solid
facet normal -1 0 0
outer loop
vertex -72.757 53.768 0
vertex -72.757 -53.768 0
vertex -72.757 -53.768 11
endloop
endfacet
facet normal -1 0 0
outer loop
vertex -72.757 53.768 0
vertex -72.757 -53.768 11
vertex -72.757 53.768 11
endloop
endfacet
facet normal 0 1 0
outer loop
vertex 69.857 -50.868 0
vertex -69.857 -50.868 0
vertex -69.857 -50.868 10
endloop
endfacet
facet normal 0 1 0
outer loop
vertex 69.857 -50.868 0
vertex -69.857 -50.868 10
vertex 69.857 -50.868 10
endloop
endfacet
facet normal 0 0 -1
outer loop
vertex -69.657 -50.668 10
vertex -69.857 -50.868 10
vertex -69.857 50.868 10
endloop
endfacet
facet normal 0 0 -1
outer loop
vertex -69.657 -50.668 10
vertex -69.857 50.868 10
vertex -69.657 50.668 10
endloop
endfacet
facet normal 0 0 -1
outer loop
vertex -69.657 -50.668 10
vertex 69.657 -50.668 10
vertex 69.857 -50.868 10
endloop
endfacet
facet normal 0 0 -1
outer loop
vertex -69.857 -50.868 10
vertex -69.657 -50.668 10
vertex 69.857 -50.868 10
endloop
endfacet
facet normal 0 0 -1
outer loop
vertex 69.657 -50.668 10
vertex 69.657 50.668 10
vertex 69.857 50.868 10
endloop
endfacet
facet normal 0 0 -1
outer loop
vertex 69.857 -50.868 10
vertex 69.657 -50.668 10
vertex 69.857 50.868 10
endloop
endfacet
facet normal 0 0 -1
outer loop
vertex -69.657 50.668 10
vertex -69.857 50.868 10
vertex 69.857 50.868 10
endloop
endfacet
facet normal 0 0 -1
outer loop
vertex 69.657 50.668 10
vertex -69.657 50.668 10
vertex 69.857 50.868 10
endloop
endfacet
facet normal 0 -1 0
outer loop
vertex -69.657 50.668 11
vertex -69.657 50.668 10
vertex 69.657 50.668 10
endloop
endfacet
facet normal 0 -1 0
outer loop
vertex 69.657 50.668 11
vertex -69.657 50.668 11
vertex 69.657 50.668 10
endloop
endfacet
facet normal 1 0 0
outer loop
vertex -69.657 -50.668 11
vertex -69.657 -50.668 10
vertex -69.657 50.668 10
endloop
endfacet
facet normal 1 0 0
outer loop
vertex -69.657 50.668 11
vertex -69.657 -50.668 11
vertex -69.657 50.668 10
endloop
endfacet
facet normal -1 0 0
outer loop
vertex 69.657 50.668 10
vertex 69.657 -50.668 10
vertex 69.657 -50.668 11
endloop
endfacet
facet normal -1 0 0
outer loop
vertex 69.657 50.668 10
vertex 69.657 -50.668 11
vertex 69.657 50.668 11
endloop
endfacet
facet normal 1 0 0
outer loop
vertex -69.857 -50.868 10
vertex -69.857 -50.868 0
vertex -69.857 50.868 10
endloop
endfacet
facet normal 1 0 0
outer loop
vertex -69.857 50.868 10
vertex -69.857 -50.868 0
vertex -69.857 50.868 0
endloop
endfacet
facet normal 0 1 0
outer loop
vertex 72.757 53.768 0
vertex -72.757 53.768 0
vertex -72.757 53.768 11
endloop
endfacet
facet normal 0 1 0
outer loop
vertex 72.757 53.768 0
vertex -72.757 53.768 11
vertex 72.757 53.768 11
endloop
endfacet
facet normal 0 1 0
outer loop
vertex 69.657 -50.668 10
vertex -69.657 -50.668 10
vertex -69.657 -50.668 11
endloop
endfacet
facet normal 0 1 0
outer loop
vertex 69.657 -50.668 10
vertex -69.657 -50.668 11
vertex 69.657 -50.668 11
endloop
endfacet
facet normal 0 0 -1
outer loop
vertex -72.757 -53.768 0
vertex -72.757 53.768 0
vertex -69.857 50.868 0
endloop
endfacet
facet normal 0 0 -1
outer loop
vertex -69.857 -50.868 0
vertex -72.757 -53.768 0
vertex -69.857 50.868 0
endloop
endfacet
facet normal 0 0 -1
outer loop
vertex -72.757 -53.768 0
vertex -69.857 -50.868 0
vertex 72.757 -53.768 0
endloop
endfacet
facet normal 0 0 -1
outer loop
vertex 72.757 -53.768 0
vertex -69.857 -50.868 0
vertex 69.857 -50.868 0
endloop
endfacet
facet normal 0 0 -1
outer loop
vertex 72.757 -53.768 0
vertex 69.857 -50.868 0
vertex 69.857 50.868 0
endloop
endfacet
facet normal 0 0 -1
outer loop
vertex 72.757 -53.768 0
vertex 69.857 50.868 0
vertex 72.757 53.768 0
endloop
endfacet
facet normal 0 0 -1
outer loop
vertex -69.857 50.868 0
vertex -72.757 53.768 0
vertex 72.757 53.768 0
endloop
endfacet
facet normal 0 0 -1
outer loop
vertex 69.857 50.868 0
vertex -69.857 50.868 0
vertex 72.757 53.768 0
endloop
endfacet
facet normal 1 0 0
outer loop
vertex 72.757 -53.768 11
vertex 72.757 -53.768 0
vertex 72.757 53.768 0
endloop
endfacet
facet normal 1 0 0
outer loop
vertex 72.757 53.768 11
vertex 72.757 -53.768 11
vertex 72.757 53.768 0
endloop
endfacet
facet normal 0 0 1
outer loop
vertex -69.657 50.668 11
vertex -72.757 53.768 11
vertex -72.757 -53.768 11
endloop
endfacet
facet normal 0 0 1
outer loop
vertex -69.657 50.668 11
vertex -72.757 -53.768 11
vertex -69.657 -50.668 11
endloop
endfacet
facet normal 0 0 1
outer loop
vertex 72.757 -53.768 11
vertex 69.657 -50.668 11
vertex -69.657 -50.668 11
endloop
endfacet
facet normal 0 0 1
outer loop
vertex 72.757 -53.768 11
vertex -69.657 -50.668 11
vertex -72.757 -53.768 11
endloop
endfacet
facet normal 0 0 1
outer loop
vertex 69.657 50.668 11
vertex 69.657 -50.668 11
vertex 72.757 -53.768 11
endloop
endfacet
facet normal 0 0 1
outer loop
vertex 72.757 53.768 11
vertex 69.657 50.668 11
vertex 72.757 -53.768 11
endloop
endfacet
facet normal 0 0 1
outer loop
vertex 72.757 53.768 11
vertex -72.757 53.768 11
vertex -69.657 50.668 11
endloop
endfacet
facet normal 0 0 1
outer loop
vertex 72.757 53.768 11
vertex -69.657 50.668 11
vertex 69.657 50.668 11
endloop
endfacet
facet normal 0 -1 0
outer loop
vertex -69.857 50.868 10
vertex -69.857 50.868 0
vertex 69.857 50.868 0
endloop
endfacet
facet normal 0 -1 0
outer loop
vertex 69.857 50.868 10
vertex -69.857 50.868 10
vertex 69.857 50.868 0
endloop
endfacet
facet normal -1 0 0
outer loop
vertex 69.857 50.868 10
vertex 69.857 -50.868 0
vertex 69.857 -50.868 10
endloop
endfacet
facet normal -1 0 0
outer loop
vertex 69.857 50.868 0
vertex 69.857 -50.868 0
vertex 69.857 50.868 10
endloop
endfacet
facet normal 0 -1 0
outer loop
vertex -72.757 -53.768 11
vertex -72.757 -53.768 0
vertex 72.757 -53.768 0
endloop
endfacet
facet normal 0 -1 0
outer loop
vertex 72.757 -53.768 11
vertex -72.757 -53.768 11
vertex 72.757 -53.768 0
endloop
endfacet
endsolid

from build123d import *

# Parameters (mm, degrees)
F0_W     = 145.514168
F0_H     = 107.53687
F0_W_2   = 139.31417
F0_H_2   = 101.336874
F1_DEPTH = 11
F2_W     = 139.714174
F2_H     = 101.736876
F2_W_2   = 139.31417
F2_H_2   = 101.336874
F3_DEPTH = 10


with BuildPart() as f1:
    # F0 (on Top) → F1 (new body)
    with BuildSketch(Plane.XY):
        Rectangle(F0_W, F0_H)
        Rectangle(F0_W_2, F0_H_2, mode=Mode.SUBTRACT)
    extrude(amount=F1_DEPTH)

    # F2 (on Top) → F3 (cut)
    with BuildSketch(Plane.XY):
        Rectangle(F2_W, F2_H)
        Rectangle(F2_W_2, F2_H_2, mode=Mode.SUBTRACT)
    extrude(amount=F3_DEPTH, mode=Mode.SUBTRACT)


solid = f1.part
